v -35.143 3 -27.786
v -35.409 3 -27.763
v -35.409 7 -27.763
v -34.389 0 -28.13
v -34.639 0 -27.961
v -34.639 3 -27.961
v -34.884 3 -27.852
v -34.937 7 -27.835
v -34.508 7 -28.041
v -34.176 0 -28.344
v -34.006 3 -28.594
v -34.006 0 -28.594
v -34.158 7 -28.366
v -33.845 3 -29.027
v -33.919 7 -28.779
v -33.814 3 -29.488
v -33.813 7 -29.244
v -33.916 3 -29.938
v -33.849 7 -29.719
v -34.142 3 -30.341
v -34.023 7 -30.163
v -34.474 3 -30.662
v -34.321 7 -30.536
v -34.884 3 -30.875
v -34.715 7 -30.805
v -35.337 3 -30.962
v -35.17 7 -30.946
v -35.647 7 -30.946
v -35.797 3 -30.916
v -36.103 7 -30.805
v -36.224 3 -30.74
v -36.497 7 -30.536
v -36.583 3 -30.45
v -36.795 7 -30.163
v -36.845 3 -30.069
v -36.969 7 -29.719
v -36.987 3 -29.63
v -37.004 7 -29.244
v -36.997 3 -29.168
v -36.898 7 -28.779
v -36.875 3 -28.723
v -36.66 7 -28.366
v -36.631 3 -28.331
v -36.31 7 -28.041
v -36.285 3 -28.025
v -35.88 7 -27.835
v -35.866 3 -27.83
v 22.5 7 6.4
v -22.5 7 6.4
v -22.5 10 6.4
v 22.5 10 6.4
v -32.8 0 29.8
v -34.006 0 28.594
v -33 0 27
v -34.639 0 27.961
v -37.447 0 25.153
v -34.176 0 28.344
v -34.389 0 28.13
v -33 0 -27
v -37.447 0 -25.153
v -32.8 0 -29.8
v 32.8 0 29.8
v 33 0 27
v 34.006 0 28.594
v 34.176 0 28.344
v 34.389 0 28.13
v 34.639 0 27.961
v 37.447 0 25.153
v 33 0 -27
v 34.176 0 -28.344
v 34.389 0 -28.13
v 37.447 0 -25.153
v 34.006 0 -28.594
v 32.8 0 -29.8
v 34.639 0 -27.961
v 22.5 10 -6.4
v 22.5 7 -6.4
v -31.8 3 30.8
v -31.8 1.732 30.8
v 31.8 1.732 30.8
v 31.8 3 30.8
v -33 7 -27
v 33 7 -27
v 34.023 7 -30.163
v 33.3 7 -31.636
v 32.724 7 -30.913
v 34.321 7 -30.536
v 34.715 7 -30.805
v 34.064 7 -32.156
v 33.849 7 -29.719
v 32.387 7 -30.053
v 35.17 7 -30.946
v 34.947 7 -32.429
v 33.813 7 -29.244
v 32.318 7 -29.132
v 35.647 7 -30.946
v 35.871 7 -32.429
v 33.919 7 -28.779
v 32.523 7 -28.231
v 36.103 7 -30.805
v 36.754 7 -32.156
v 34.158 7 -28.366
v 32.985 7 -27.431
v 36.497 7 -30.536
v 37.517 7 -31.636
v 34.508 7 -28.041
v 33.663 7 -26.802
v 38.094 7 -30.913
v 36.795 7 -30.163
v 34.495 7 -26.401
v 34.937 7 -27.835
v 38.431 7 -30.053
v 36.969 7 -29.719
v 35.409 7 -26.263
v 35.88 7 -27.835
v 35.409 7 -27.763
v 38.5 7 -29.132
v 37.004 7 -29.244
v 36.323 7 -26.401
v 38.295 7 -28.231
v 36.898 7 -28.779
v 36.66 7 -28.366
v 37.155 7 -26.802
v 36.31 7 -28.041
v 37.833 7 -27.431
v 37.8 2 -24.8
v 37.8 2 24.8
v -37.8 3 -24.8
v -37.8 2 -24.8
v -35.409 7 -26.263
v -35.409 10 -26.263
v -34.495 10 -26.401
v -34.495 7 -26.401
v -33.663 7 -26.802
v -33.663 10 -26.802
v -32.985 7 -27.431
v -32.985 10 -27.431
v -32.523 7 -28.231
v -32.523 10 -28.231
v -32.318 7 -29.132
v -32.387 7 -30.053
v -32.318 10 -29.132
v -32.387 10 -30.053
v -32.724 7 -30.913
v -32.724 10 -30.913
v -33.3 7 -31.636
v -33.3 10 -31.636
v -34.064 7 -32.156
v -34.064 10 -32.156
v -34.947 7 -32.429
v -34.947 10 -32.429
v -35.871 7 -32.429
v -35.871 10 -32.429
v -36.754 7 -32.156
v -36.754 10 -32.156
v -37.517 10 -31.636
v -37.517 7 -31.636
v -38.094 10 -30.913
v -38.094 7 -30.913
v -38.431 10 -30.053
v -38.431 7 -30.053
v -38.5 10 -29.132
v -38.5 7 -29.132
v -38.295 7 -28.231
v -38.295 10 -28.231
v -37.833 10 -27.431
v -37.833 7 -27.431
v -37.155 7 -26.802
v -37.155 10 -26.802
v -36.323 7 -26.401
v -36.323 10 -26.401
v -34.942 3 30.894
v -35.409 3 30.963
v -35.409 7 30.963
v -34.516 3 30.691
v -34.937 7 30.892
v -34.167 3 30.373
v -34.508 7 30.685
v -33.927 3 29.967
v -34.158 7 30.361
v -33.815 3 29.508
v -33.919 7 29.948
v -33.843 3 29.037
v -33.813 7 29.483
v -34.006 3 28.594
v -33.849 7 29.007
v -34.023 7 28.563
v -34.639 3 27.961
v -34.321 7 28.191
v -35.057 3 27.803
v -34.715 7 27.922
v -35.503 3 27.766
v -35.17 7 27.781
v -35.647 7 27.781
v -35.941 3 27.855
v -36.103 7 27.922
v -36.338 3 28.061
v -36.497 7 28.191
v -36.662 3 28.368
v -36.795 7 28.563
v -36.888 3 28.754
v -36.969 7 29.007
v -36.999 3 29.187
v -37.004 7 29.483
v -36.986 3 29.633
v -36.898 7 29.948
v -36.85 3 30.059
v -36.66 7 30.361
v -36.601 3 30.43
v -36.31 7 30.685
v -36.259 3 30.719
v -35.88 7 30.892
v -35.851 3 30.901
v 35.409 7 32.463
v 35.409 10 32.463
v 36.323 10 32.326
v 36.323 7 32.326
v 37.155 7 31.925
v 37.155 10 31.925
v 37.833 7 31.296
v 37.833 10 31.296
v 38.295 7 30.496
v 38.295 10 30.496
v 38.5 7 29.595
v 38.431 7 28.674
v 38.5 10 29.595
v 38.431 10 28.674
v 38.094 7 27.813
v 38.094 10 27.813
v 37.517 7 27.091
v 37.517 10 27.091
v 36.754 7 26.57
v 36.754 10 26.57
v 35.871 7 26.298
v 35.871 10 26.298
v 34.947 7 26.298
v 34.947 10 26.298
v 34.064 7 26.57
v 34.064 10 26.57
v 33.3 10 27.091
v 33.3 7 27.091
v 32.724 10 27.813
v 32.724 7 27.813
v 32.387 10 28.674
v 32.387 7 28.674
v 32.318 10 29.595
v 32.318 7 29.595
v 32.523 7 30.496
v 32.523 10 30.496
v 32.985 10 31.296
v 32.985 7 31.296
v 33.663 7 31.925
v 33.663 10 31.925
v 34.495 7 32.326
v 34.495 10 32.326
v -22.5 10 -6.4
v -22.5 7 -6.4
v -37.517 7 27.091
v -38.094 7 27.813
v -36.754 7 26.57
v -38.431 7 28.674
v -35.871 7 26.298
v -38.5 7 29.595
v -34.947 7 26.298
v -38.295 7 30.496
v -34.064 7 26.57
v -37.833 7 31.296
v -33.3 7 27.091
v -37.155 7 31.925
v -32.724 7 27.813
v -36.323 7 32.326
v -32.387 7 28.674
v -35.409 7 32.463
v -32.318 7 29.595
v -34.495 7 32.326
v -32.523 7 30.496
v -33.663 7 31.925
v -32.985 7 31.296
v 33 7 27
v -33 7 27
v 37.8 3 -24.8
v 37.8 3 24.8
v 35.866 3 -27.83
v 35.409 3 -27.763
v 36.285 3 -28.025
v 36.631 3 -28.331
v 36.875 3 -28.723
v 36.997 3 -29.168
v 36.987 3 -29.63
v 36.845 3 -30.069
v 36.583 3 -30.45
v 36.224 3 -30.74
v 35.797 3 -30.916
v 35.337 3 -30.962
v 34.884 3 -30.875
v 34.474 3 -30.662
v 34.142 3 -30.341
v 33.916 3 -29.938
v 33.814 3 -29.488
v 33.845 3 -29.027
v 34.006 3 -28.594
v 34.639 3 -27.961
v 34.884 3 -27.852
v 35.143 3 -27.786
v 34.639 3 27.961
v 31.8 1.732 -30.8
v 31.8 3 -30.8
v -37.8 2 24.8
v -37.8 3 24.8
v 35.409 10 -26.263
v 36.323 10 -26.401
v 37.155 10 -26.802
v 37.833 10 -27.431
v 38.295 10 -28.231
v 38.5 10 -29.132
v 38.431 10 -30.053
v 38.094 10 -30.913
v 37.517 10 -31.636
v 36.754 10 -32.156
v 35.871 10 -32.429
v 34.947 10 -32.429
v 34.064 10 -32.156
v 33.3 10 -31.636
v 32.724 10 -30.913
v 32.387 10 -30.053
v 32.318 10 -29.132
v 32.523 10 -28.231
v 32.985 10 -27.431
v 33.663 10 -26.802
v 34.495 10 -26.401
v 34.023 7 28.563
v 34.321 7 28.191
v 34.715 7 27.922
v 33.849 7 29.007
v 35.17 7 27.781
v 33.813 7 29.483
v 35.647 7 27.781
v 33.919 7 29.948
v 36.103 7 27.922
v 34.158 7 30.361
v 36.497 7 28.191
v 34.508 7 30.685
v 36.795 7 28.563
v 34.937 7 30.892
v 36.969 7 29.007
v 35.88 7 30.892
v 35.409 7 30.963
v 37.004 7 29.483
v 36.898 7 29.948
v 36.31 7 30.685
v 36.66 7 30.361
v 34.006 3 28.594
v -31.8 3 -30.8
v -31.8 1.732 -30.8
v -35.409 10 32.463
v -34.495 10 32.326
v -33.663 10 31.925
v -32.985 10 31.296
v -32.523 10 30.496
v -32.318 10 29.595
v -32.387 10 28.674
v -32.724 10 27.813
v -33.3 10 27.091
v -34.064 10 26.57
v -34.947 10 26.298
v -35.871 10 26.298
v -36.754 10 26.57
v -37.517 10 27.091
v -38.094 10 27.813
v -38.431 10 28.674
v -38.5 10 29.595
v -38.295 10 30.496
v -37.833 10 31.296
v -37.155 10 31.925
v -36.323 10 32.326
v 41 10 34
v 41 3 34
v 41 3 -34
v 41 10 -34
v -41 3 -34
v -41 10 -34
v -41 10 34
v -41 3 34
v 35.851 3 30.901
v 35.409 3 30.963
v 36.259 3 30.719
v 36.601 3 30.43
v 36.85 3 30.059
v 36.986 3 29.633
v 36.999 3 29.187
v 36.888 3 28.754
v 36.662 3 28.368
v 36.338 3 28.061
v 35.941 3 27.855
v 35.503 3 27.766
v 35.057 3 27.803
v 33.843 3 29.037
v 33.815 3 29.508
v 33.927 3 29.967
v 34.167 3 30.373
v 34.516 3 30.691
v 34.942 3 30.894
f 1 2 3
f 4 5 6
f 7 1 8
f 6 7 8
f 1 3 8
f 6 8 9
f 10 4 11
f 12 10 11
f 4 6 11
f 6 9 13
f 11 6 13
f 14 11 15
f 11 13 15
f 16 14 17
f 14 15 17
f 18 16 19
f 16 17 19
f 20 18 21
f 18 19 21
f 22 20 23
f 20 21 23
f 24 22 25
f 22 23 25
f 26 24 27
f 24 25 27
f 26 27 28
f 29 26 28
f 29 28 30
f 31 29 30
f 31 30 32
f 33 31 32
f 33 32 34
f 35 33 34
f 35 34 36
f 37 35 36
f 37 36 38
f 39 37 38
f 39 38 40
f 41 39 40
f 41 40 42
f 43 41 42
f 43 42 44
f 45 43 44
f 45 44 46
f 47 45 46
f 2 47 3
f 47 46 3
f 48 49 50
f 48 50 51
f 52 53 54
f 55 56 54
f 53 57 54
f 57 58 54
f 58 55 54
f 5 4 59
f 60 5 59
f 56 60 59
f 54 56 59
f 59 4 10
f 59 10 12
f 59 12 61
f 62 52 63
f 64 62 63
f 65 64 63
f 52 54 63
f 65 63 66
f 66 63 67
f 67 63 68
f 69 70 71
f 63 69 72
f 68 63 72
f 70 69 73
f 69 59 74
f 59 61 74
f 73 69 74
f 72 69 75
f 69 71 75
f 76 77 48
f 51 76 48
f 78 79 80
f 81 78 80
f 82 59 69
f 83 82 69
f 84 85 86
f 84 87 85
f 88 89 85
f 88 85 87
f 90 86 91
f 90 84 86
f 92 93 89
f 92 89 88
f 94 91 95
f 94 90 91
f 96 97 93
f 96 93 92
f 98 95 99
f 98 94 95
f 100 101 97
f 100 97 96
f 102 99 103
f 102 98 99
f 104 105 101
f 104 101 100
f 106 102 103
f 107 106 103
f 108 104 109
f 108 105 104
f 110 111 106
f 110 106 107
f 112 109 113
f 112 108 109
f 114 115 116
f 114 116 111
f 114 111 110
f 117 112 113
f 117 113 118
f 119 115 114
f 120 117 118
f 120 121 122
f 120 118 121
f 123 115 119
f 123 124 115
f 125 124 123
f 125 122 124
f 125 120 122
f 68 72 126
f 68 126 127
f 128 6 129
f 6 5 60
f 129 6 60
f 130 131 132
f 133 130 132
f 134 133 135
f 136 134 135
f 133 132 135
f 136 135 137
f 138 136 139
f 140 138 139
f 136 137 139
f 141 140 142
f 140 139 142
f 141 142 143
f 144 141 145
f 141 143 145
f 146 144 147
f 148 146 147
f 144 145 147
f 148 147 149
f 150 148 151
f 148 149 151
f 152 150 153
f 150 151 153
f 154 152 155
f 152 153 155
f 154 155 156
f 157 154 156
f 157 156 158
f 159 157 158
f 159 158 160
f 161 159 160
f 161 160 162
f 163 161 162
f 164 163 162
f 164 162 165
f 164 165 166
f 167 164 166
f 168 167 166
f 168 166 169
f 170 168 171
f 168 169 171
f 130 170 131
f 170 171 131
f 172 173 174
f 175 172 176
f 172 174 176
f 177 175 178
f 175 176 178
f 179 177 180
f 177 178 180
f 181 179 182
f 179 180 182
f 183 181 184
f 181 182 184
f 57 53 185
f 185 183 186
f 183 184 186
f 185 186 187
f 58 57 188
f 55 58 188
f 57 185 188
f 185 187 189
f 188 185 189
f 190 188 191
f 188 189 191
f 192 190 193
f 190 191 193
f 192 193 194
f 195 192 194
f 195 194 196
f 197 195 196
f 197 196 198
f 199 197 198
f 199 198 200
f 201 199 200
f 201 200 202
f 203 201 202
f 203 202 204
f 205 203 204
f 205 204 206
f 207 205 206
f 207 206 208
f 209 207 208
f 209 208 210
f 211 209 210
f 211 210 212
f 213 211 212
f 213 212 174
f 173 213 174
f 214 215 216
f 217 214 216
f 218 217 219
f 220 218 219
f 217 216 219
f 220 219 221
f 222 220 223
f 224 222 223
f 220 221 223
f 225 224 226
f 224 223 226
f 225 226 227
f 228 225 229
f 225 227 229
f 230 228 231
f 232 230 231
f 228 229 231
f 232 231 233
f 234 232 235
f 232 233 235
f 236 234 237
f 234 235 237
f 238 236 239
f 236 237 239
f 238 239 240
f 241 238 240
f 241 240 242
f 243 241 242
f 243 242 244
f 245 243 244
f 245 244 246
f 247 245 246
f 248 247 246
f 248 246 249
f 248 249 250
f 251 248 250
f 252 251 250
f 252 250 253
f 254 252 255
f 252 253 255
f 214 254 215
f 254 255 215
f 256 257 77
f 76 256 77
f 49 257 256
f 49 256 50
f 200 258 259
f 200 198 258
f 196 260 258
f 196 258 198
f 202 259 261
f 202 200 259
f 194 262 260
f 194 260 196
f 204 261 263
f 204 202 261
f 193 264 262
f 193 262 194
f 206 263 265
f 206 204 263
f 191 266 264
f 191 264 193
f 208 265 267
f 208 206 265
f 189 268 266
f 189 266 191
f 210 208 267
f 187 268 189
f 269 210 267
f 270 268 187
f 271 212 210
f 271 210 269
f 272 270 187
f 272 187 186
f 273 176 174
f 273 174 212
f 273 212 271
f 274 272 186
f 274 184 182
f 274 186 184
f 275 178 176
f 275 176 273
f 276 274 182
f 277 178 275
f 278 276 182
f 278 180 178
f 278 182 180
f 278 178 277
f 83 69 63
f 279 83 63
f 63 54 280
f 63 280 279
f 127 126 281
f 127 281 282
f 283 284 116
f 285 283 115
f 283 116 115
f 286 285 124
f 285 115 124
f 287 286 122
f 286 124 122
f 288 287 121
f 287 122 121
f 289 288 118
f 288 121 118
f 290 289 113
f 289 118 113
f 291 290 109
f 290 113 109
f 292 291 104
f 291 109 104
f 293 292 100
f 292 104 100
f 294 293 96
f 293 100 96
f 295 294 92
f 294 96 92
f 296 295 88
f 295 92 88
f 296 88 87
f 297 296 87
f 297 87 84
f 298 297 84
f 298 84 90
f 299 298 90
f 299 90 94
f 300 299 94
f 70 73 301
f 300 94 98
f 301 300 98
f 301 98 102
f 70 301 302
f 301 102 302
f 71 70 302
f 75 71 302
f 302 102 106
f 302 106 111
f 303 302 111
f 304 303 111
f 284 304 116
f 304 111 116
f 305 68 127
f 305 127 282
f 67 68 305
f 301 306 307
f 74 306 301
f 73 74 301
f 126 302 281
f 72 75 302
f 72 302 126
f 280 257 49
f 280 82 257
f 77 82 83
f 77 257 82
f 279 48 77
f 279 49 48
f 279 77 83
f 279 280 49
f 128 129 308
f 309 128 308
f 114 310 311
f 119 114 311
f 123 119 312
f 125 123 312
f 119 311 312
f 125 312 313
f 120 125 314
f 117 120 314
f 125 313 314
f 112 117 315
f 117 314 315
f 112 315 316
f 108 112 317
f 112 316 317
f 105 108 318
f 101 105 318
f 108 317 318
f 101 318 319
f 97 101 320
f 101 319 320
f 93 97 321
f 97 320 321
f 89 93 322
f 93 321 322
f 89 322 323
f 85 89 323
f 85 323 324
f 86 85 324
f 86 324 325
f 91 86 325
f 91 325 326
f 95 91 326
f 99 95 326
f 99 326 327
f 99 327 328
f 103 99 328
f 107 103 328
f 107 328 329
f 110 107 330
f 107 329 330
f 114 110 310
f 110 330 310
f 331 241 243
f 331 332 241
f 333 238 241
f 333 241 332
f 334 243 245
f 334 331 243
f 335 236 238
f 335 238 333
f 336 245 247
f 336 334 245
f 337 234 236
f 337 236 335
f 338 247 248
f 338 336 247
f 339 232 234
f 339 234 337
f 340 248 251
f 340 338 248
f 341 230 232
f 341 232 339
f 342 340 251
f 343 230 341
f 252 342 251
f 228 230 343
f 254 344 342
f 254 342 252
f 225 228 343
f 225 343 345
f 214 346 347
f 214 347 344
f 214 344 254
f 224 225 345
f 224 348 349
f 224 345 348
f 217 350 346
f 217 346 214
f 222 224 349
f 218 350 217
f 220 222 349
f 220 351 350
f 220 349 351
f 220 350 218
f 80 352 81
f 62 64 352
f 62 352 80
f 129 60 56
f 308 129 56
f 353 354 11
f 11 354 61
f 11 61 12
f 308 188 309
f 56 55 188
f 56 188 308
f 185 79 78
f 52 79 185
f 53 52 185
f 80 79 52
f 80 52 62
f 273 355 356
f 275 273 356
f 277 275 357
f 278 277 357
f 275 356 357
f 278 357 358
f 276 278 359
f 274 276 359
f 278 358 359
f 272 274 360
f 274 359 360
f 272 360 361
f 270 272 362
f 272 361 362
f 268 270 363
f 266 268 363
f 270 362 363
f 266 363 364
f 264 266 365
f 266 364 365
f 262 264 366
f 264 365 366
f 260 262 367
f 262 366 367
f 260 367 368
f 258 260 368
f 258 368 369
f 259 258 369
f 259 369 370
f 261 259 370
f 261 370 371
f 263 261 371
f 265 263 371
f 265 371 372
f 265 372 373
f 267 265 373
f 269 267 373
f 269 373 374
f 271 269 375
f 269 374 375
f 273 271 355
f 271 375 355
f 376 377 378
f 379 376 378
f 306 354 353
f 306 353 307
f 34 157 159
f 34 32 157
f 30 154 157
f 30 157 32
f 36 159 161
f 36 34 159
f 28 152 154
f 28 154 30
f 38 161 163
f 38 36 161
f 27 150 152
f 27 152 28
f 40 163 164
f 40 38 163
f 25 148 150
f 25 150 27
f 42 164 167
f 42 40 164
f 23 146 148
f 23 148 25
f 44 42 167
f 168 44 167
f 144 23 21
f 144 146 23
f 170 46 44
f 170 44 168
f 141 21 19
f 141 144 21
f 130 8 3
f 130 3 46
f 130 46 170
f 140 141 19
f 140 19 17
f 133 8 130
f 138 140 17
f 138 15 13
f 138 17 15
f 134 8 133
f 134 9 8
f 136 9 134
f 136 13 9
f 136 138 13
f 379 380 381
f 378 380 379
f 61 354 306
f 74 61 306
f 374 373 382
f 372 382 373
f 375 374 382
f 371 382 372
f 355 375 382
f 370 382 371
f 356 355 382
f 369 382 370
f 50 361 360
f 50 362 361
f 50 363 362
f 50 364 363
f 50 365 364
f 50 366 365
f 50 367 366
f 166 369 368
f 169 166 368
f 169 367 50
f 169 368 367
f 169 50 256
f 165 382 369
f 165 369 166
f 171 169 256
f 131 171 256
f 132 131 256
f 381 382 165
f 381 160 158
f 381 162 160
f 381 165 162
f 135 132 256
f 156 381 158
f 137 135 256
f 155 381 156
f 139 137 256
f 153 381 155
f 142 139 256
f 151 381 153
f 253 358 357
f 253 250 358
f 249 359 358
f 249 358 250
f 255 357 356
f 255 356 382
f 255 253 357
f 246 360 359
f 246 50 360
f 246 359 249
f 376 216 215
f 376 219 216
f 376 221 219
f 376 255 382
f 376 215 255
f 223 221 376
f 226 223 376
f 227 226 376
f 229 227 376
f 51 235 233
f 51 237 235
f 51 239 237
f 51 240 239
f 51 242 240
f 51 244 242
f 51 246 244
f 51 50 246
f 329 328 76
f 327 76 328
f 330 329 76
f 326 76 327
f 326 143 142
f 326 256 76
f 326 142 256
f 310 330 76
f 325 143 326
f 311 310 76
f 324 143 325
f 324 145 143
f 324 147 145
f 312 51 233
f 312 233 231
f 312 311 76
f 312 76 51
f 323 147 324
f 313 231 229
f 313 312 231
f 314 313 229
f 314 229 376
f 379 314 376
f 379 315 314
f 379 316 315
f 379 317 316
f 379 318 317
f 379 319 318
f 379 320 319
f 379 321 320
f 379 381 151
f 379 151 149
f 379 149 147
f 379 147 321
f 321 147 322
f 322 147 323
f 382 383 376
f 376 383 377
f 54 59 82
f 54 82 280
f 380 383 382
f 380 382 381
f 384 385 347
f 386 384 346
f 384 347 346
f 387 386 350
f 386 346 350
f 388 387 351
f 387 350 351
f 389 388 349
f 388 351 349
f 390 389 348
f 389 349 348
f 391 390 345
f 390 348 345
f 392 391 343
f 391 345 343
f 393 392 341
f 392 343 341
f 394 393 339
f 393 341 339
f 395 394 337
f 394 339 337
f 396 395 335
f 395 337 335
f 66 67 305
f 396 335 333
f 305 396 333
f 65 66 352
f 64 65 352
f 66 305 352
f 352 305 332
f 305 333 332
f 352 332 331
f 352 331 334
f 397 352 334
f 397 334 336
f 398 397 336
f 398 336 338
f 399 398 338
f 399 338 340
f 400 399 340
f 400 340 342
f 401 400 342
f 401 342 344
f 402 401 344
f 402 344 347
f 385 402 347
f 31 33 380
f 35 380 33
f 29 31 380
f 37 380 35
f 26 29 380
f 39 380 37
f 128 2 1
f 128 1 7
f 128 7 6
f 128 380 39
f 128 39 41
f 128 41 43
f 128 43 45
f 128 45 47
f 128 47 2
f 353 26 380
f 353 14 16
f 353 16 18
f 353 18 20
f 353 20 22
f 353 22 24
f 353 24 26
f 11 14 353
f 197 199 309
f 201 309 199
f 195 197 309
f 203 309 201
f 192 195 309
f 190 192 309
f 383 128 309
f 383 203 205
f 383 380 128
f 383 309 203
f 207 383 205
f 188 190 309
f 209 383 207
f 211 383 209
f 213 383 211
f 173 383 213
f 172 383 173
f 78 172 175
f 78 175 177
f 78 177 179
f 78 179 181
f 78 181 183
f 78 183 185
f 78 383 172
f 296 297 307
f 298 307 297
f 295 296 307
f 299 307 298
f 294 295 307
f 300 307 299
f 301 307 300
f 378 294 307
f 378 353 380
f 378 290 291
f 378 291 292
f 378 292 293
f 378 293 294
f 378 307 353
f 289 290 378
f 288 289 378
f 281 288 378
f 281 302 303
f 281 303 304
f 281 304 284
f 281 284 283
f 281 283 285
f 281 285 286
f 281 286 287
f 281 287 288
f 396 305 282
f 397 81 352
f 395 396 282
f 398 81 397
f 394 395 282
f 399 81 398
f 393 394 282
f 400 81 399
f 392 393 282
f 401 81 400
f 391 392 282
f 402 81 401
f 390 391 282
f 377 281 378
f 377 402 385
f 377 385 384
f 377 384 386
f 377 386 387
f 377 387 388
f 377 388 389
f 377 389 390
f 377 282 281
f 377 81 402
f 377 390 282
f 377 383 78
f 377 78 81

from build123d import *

# Parameters (mm, degrees)
SKETCH1_W             = 76
SKETCH1_H             = 62
BOSS_EXTRUDE1_DEPTH   = 2
SKETCH2_W             = 82
SKETCH2_H             = 68
BOSS_EXTRUDE2_DEPTH   = 8
SKETCH3_W             = 45
SKETCH3_H             = 12.8
CUT_EXTRUDE1_DEPTH    = 11
SKETCH4_R             = 1.6
CUT_EXTRUDE2_DEPTH    = 11
SKETCH5_R             = 3.1
CUT_EXTRUDE3_DEPTH    = 3
SKETCH9_OUTSIDE_W     = 105.4
SKETCH9_OUTSIDE_H     = 91.4
SKETCH9_OUTSIDE_W_2   = 75.6
SKETCH9_OUTSIDE_H_2   = 61.6
CUT_EXTRUDE5_DEPTH    = 3
CUT_EXTRUDE6_DEPTH    = 3
SKETCH11_W            = 66
SKETCH11_H            = 54
CUT_EXTRUDE7_DEPTH    = 7
CHAMFER2_SIZE         = 2
CHAMFER2_SIZE2        = 0.352653961
CHAMFER2_PART_2_SIZE  = 2
CHAMFER2_PART_2_SIZE2 = 0.352653961
CHAMFER3_SIZE         = 1
CHAMFER3_SIZE2        = 1.732050808


with BuildPart() as part:
    # Sketch1 → Boss-Extrude1 (new body)
    with BuildSketch(Plane(origin=(0, 0, 0), x_dir=(1, 0, 0), z_dir=(0, 1, 0))):
        Rectangle(SKETCH1_W, SKETCH1_H)
    extrude(amount=BOSS_EXTRUDE1_DEPTH)

    # Sketch2 → Boss-Extrude2 (add)
    with BuildSketch(Plane(origin=(0, 2, 0), x_dir=(1, 0, 0), z_dir=(0, 1, 0))):
        Rectangle(SKETCH2_W, SKETCH2_H)
    extrude(amount=BOSS_EXTRUDE2_DEPTH)

    # Sketch3 → Cut-Extrude1 (cut, through all)
    with BuildSketch(Plane.XZ):
        Rectangle(SKETCH3_W, SKETCH3_H)
    extrude(amount=-CUT_EXTRUDE1_DEPTH, mode=Mode.SUBTRACT)

    # Sketch4 → Cut-Extrude2 (cut, through all)
    with BuildSketch(Plane(origin=(0, 10, 0), x_dir=(1, 0, 0), z_dir=(0, 1, 0))):
        with Locations(Location((-35.408866178, 29.363450001, 0), (0, 0, 270))):  # turned: the seam where the file's is
            Circle(SKETCH4_R)
        with Locations(Location((35.408866178, 29.363450001, 0), (0, 0, 270))):  # turned: the seam where the file's is
            Circle(SKETCH4_R)
        with Locations(Location((35.408866178, -29.363450001, 0), (0, 0, 270))):  # turned: the seam where the file's is
            Circle(SKETCH4_R)
        with Locations(Location((-35.408866178, -29.363450001, 0), (0, 0, 270))):  # turned: the seam where the file's is
            Circle(SKETCH4_R)
    extrude(amount=-CUT_EXTRUDE2_DEPTH, mode=Mode.SUBTRACT)

    # Sketch5 → Cut-Extrude3 (cut)
    with BuildSketch(Plane(origin=(0, 10, 0), x_dir=(1, 0, 0), z_dir=(0, 1, 0))):
        with Locations(Location((-35.408866178, 29.363450001, 0), (0, 0, 270))):  # turned: the seam where the file's is
            Circle(SKETCH5_R)
        with Locations(Location((35.408866178, 29.363450001, 0), (0, 0, 270))):  # turned: the seam where the file's is
            Circle(SKETCH5_R)
        with Locations(Location((35.408866178, -29.363450001, 0), (0, 0, 270))):  # turned: the seam where the file's is
            Circle(SKETCH5_R)
        with Locations(Location((-35.408866178, -29.363450001, 0), (0, 0, 270))):  # turned: the seam where the file's is
            Circle(SKETCH5_R)
    extrude(amount=-CUT_EXTRUDE3_DEPTH, mode=Mode.SUBTRACT)

    # Sketch9 outside → Cut-Extrude5 (cut)
    with BuildSketch(Plane.XZ):
        Rectangle(SKETCH9_OUTSIDE_W, SKETCH9_OUTSIDE_H)
        Rectangle(SKETCH9_OUTSIDE_W_2, SKETCH9_OUTSIDE_H_2, mode=Mode.SUBTRACT)
    extrude(amount=-CUT_EXTRUDE5_DEPTH, mode=Mode.SUBTRACT)

    # Sketch10 → Cut-Extrude6 (cut)
    with BuildSketch(Plane.XZ):
        Polygon((-37.8, -30.8), (-31.8, -30.8), (-37.8, -24.8), align=None)
        Polygon((-37.8, 24.8), (-37.8, 30.8), (-31.8, 30.8), align=None)
        Polygon((37.8, 30.8), (37.8, 24.8), (31.8, 30.8), align=None)
        Polygon((37.8, -30.8), (31.8, -30.8), (37.8, -24.8), align=None)
    extrude(amount=-CUT_EXTRUDE6_DEPTH, mode=Mode.SUBTRACT)

    # Sketch11 → Cut-Extrude7 (cut)
    with BuildSketch(Plane.XZ):
        Rectangle(SKETCH11_W, SKETCH11_H)
    extrude(amount=-CUT_EXTRUDE7_DEPTH, mode=Mode.SUBTRACT)

    # Chamfer2
    chamfer2_edges = [part.edges().sort_by_distance(p)[0] for p in [
        (37.8, 0, 0),
    ]]
    chamfer2_side = [part.faces().sort_by_distance(p)[0] for p in [
        (37.8, 1.5, 0),
    ]]
    chamfer(chamfer2_edges, length=CHAMFER2_SIZE, length2=CHAMFER2_SIZE2, reference=chamfer2_side[0])

    # Chamfer2 part 2
    chamfer2_part_2_edges = [part.edges().sort_by_distance(p)[0] for p in [
        (-37.8, 0, 0),
    ]]
    chamfer2_part_2_side = [part.faces().sort_by_distance(p)[0] for p in [
        (-37.8, 1.5, 0),
    ]]
    chamfer(chamfer2_part_2_edges, length=CHAMFER2_PART_2_SIZE, length2=CHAMFER2_PART_2_SIZE2, reference=chamfer2_part_2_side[0])

    # Chamfer3
    chamfer3_edges = [part.edges().sort_by_distance(p)[0] for p in [
        (0, 0, -30.8),
        (0, 0, 30.8),
    ]]
    chamfer3_side = [part.faces().sort_by_distance(p)[0] for p in [
        (-35.357643735, 0, 25.870950059),
    ]]
    chamfer(chamfer3_edges, length=CHAMFER3_SIZE, length2=CHAMFER3_SIZE2, reference=chamfer3_side[0])


solid = part.part
